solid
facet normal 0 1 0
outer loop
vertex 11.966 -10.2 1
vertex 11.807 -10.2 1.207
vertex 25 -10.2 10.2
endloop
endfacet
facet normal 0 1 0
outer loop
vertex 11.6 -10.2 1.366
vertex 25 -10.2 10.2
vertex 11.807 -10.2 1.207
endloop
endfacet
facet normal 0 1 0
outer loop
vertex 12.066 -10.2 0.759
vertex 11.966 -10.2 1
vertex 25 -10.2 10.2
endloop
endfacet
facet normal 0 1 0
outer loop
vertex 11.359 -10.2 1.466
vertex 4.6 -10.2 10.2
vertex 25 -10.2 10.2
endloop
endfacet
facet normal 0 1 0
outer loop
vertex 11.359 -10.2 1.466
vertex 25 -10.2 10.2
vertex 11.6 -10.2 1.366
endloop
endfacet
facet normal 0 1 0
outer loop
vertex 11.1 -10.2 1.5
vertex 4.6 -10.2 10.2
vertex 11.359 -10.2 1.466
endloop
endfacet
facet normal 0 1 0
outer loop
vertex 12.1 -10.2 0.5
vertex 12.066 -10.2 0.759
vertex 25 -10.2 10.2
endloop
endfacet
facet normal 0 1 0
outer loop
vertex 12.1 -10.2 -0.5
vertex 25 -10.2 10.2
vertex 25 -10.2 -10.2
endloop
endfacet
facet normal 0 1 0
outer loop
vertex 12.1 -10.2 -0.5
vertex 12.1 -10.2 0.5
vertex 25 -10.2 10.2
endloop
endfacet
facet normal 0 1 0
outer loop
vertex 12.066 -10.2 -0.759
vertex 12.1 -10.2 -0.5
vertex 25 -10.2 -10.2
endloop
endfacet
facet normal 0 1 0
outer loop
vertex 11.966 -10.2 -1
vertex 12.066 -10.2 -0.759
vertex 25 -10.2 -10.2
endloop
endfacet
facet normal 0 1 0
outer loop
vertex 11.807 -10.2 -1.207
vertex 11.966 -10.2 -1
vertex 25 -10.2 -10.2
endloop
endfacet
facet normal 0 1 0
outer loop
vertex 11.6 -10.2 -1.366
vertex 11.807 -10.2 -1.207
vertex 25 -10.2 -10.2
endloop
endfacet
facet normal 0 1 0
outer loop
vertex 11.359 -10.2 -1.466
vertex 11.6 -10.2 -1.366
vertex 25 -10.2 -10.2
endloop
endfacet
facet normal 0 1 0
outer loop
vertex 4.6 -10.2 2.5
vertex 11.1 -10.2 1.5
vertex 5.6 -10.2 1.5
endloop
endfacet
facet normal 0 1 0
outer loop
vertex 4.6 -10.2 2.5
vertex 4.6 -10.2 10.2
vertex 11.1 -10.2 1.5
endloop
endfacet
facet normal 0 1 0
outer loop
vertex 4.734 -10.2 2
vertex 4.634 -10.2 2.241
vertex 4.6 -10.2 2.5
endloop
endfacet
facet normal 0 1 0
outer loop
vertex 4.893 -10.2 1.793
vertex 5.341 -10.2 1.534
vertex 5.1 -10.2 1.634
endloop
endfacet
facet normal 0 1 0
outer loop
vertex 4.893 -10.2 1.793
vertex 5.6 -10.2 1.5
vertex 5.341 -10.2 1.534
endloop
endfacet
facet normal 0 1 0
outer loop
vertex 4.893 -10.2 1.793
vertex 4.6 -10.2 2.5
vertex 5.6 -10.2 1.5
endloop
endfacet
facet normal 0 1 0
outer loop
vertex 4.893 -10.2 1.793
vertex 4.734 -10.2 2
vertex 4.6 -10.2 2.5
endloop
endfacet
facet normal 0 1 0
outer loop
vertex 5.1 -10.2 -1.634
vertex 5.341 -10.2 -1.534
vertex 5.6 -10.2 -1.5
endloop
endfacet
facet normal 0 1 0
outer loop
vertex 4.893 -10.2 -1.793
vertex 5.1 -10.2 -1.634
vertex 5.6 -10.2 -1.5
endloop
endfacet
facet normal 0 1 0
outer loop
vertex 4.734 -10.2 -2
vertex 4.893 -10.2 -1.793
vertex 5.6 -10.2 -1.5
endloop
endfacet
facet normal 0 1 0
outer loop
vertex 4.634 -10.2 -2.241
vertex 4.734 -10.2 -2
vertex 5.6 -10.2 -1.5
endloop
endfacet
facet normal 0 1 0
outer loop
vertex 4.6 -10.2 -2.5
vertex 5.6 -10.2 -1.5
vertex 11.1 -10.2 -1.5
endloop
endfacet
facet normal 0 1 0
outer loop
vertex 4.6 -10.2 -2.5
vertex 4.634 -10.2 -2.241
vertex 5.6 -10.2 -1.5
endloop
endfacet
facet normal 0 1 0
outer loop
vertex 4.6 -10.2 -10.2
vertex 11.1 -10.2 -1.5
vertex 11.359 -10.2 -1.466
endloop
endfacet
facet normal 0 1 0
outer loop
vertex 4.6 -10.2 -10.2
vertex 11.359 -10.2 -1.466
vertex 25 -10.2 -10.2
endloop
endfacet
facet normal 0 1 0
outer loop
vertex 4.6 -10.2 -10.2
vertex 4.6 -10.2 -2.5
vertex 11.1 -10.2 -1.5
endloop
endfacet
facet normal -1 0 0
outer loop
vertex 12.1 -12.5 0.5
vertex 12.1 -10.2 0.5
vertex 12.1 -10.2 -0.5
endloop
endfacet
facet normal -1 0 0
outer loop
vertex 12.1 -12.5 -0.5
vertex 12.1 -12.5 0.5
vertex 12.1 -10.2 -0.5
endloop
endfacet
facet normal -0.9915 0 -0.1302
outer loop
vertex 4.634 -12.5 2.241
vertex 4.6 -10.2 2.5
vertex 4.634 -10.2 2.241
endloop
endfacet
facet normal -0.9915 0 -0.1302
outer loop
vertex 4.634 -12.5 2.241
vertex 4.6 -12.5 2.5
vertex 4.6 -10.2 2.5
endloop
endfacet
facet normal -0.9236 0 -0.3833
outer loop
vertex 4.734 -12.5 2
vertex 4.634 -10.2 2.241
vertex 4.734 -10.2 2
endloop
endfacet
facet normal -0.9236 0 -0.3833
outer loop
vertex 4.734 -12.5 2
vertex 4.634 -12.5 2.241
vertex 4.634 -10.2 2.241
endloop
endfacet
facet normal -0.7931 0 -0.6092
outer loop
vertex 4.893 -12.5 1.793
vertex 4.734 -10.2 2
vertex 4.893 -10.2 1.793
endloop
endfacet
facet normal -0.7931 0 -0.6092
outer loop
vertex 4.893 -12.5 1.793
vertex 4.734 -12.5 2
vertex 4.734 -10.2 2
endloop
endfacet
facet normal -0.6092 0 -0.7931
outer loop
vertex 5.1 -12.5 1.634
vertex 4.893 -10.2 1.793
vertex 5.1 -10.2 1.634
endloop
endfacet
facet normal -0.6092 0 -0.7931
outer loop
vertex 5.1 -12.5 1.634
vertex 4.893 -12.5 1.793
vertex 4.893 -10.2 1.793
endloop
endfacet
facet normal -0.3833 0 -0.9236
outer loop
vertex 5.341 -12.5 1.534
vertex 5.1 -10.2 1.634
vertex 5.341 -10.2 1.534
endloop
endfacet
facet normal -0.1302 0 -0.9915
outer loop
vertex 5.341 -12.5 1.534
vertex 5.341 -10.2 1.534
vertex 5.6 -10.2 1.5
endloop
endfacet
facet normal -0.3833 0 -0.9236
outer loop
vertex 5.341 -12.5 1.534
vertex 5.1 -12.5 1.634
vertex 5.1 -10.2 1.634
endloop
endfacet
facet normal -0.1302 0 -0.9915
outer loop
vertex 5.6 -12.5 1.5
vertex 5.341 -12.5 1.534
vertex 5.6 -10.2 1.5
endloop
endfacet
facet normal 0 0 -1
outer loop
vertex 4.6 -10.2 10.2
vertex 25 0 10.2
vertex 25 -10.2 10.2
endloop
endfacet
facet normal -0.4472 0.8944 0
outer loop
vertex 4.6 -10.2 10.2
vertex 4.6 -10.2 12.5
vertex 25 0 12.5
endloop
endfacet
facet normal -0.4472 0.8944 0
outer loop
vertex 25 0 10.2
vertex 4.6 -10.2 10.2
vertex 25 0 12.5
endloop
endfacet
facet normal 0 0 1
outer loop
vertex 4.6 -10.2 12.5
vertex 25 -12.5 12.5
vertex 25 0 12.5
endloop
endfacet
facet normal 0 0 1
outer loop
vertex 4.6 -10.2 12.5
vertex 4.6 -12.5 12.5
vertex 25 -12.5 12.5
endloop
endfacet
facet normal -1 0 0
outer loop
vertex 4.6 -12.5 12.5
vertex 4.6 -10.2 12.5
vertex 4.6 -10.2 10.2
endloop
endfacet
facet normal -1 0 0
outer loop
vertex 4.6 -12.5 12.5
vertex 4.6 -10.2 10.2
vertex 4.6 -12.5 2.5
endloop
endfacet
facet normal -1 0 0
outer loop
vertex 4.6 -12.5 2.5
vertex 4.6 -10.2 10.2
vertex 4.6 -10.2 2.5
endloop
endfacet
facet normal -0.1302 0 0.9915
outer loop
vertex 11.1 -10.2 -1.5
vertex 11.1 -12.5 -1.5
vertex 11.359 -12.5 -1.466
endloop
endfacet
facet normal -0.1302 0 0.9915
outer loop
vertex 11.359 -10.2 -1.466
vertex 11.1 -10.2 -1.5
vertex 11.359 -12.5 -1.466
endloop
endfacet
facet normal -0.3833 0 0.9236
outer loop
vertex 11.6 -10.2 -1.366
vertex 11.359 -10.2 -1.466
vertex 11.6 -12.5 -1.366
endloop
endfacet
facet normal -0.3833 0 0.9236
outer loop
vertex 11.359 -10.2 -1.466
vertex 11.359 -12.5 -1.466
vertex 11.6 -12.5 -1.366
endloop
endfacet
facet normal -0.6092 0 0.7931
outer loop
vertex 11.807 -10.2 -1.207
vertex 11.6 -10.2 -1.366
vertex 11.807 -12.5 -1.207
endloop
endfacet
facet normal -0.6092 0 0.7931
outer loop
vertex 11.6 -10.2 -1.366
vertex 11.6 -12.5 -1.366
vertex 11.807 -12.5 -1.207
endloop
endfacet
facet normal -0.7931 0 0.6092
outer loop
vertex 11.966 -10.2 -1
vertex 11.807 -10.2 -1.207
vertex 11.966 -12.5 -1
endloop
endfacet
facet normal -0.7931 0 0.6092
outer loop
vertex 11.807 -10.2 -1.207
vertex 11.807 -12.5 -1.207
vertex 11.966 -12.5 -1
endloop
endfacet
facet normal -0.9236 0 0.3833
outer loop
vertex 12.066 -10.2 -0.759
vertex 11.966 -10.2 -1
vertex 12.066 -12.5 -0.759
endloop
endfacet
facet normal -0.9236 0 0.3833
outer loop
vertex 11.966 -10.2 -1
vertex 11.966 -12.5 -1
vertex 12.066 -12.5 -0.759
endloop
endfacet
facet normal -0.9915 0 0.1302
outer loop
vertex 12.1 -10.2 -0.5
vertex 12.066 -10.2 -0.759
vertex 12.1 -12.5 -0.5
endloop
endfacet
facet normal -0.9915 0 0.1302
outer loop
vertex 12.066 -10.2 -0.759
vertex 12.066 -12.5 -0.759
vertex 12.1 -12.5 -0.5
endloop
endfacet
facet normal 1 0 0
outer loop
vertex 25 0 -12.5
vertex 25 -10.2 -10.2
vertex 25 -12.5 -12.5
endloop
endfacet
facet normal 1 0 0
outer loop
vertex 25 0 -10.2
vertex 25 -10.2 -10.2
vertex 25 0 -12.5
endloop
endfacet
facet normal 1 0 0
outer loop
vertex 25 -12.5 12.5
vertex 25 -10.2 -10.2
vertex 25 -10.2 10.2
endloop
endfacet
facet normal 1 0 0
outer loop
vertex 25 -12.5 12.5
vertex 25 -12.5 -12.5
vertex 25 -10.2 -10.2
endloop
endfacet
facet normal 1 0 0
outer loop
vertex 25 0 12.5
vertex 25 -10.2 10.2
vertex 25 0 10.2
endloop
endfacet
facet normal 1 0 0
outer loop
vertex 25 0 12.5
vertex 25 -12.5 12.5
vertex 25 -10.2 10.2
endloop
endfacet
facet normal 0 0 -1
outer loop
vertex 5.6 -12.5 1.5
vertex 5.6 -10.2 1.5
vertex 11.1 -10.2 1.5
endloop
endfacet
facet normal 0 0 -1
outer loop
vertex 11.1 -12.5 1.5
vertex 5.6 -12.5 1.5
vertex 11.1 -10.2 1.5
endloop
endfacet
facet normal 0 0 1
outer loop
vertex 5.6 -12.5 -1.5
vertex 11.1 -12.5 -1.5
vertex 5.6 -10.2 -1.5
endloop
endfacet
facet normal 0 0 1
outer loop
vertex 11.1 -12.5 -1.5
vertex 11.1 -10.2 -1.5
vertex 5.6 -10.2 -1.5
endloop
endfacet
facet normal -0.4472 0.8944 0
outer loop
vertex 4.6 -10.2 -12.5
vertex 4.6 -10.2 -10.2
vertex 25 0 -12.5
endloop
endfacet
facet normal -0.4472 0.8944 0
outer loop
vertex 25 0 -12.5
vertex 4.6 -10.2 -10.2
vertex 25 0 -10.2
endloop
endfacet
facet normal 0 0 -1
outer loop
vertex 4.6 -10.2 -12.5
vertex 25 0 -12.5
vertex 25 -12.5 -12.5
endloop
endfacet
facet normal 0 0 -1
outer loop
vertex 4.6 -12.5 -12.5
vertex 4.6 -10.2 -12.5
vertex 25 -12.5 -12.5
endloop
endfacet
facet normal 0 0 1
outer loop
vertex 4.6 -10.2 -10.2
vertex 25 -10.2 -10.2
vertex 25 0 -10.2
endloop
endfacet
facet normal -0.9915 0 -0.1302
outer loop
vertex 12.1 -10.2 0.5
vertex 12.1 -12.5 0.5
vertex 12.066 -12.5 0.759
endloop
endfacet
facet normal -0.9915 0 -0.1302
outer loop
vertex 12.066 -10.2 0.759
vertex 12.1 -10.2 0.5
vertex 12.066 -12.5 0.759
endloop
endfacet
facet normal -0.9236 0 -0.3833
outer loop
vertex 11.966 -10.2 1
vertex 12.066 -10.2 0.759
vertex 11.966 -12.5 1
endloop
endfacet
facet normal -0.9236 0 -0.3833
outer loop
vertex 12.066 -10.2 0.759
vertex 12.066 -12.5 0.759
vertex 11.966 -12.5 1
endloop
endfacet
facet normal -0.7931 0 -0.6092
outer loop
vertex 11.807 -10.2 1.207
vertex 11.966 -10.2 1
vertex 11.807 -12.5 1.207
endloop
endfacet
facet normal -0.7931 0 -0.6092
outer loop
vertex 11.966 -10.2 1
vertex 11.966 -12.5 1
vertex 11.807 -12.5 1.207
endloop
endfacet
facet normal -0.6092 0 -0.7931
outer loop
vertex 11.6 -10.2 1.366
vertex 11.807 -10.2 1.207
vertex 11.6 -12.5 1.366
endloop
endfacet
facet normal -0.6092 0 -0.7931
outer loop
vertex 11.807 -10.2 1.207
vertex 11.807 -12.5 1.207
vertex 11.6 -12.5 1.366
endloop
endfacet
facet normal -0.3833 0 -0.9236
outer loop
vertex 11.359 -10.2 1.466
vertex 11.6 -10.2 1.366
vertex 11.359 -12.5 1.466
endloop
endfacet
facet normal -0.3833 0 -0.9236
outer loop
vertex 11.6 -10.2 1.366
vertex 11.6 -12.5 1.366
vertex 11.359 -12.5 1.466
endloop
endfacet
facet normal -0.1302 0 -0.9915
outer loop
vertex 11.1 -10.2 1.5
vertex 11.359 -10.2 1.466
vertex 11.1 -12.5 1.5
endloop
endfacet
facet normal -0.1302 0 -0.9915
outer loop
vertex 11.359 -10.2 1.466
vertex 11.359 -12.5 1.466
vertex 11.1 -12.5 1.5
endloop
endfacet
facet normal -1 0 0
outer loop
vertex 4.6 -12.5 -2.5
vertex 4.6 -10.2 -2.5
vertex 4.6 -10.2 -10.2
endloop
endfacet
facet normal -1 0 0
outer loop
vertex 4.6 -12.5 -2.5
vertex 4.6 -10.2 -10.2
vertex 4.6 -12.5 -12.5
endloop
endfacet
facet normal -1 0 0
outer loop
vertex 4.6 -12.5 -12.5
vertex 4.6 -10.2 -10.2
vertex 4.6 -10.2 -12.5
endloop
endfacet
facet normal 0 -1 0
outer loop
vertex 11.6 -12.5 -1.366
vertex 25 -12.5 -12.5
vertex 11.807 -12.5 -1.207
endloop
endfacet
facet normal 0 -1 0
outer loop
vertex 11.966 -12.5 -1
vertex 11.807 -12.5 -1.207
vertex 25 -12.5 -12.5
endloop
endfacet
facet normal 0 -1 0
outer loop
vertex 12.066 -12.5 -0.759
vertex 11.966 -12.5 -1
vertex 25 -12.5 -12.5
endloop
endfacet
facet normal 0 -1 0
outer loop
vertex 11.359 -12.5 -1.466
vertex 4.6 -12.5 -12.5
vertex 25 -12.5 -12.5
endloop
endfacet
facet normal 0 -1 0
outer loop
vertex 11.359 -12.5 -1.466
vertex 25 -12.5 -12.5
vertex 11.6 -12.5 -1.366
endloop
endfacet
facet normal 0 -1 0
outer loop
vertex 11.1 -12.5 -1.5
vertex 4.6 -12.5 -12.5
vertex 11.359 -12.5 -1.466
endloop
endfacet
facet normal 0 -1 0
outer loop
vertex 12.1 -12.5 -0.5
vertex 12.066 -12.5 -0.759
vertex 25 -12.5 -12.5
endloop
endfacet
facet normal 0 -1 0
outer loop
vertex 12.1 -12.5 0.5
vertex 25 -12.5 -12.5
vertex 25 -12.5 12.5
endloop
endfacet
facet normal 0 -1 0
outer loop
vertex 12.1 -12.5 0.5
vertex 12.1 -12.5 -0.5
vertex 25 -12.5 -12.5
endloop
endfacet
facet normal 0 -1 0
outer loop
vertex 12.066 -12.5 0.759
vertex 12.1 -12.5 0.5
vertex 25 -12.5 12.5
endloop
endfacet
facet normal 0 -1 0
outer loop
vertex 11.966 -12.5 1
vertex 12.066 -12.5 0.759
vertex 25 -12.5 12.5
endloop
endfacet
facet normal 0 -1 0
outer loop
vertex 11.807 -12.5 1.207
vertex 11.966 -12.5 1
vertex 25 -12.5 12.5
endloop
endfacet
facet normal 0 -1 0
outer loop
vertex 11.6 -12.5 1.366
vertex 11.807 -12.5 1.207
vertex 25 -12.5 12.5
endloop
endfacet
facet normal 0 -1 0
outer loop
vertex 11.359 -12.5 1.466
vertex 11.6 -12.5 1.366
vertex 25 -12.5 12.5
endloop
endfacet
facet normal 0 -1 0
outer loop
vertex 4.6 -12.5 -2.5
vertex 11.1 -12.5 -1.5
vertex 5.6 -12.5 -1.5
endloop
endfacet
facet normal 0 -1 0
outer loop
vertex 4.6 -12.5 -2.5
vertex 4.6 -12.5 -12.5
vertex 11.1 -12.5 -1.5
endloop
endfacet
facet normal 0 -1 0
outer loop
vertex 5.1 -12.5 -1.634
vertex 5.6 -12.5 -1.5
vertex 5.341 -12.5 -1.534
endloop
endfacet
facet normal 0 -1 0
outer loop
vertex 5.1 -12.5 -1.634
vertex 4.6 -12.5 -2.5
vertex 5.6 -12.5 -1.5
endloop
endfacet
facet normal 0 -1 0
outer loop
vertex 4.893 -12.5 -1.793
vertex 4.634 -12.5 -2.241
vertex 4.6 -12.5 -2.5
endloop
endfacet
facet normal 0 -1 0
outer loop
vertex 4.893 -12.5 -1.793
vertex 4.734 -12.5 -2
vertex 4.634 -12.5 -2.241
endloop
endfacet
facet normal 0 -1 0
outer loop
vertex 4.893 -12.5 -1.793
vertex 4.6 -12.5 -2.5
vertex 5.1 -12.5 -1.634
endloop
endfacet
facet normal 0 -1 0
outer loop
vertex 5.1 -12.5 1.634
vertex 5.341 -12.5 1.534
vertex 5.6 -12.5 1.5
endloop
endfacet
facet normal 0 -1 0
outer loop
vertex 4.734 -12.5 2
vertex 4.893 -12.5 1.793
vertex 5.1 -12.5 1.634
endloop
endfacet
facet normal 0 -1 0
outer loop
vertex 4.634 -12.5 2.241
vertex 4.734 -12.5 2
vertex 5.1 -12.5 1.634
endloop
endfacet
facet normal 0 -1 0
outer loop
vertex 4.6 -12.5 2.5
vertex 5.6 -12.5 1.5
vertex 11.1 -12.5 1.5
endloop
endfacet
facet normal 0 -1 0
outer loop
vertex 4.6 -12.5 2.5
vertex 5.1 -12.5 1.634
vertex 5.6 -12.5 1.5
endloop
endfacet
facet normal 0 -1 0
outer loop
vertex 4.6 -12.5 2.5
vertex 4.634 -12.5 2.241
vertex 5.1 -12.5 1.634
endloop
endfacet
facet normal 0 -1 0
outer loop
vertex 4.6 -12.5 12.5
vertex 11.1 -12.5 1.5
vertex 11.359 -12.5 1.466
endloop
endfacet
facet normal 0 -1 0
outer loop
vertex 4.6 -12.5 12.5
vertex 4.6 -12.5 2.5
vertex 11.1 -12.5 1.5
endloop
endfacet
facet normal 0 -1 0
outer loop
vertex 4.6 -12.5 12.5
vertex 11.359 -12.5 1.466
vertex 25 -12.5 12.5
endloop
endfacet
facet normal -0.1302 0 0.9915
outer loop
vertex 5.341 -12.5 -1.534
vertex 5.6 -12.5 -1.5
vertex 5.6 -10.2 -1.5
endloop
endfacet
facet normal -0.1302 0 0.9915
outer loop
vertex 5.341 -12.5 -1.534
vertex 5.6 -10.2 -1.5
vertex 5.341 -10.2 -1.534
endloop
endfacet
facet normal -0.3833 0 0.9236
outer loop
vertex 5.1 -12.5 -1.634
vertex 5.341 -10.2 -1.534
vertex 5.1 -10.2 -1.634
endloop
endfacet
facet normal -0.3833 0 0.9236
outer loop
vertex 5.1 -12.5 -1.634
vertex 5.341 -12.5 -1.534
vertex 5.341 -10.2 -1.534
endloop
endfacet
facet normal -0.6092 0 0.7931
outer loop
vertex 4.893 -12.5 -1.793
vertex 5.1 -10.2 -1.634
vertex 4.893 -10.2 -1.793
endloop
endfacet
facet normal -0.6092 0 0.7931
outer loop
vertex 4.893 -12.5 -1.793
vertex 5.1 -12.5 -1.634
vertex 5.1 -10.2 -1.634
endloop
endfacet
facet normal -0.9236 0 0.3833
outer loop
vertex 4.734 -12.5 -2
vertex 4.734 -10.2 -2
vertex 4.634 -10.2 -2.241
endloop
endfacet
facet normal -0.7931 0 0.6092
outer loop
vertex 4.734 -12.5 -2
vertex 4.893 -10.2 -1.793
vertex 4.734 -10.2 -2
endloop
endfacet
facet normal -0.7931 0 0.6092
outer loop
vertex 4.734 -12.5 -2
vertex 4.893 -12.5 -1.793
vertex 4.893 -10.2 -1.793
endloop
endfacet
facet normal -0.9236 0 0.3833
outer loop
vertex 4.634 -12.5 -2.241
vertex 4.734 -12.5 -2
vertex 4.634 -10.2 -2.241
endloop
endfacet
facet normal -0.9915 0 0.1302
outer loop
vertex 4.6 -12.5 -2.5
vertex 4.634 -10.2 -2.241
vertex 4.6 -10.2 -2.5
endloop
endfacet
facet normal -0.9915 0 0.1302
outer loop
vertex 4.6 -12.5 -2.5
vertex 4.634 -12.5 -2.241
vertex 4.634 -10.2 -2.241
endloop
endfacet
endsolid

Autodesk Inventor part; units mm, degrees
ref_plane "YZ Plane" through (0, 0, 0) normal (1, 0, 0) x (0, 1, 0)
ref_plane "XZ Plane" through (0, 0, 0) normal (0, 1, 0) x (-1, 0, 0)
ref_plane "XY Plane" through (0, 0, 0) normal (0, 0, 1) x (1, 0, 0)
sketch "スケッチ1" plane through (0, 0, 0) normal (1, 0, 0) x (0, 1, 0)
  line L0 (-12.5, 12.5) -> (12.5, 12.5)
  line L1 (12.5, 12.5) -> (12.5, -12.5)
  line L2 (12.5, -12.5) -> (-12.5, -12.5)
  line L3 (-12.5, -12.5) -> (-12.5, 12.5)
  line L4 (-12.5, 12.5) -> (12.5, -12.5) construction
  line L5 (12.5, 12.5) -> (-12.5, -12.5) construction
  line L6 (10.2, 10.2) -> (-10.2, 10.2)
  line L7 (-10.2, 10.2) -> (-10.2, -10.2)
  line L8 (-10.2, -10.2) -> (10.2, -10.2)
  line L9 (10.2, -10.2) -> (10.2, 10.2)
  point P0 (0, 0)
  dimension "d0" = 25
  dimension "d1" = 25
  dimension "d2" = 2.3
extrude "押し出し1" add sketch "スケッチ1" along normal blind 25
sketch "スケッチ2" plane through (0, -12.5, 12.5) normal (0, 0, 1) x (1, 0, 0)
  line L0 (25, 25) -> (25, 0) projected
  line L1 (0, 12.5) -> (25, 12.5)
  line L2 (25, 12.5) -> (25, 25)
  line L3 (25, 25) -> (0, 25)
  line L4 (0, 25) -> (0, 12.5)
extrude "押し出し2" cut sketch "スケッチ2" against normal through all
sketch "スケッチ3" plane through (0, -12.5, 12.5) normal (0, 0, 1) x (1, 0, 0)
  line L0 (0, 0) -> (0, 12.5) projected
  line L1 (0, 0) -> (25, 12.5)
  line L2 (25, 12.5) -> (0, 12.5) projected
extrude "押し出し3" cut sketch "スケッチ3" against normal through all
sketch "スケッチ4" plane through (25, -10.2, 10.2) normal (0, 1, 0) x (1, 0, 0)
  line L0 (-25, -2.3) -> (0, -2.3) projected
  line L1 (-25, 22.7) -> (0, 22.7) projected
  line L2 (-25, -2.3) -> (-20.4, -2.3)
  line L3 (-20.4, -2.3) -> (-20.4, 22.7)
  line L4 (-20.4, 22.7) -> (-25, 22.7)
  line L5 (-25, 22.7) -> (-25, -2.3)
  line L6 (-20.4, 20.4) -> (-20.4, 0) projected
  point P0 (-25, 10.2)
extrude "押し出し4" cut sketch "スケッチ4" against normal blind 10
sketch "スケッチ5" plane through (25, -10.2, 10.2) normal (0, 1, 0) x (1, 0, 0)
  line L0 (-20.4, 8.7) -> (-12.9, 8.7)
  line L1 (-12.9, 8.7) -> (-12.9, 11.7)
  line L2 (-12.9, 11.7) -> (-20.4, 11.7)
  line L3 (-20.4, 11.7) -> (-20.4, 8.7)
  line L4 (-20.4, 20.4) -> (-20.4, 0) projected
  point P0 (-25, 10.2)
  point P1 (-20.4, 10.2)
  dimension "d11" = 3
  dimension "d12" = 7.5
extrude "押し出し5" cut sketch "スケッチ5" against normal blind 10
fillet "フィレット1" radius 1 4 edges at (4.6, -11.35, -1.5) (4.6, -11.35, 1.5) (12.1, -11.35, -1.5) (12.1, -11.35, 1.5)
equation "\"d1\" = d0"
properties part number "wire lead"
